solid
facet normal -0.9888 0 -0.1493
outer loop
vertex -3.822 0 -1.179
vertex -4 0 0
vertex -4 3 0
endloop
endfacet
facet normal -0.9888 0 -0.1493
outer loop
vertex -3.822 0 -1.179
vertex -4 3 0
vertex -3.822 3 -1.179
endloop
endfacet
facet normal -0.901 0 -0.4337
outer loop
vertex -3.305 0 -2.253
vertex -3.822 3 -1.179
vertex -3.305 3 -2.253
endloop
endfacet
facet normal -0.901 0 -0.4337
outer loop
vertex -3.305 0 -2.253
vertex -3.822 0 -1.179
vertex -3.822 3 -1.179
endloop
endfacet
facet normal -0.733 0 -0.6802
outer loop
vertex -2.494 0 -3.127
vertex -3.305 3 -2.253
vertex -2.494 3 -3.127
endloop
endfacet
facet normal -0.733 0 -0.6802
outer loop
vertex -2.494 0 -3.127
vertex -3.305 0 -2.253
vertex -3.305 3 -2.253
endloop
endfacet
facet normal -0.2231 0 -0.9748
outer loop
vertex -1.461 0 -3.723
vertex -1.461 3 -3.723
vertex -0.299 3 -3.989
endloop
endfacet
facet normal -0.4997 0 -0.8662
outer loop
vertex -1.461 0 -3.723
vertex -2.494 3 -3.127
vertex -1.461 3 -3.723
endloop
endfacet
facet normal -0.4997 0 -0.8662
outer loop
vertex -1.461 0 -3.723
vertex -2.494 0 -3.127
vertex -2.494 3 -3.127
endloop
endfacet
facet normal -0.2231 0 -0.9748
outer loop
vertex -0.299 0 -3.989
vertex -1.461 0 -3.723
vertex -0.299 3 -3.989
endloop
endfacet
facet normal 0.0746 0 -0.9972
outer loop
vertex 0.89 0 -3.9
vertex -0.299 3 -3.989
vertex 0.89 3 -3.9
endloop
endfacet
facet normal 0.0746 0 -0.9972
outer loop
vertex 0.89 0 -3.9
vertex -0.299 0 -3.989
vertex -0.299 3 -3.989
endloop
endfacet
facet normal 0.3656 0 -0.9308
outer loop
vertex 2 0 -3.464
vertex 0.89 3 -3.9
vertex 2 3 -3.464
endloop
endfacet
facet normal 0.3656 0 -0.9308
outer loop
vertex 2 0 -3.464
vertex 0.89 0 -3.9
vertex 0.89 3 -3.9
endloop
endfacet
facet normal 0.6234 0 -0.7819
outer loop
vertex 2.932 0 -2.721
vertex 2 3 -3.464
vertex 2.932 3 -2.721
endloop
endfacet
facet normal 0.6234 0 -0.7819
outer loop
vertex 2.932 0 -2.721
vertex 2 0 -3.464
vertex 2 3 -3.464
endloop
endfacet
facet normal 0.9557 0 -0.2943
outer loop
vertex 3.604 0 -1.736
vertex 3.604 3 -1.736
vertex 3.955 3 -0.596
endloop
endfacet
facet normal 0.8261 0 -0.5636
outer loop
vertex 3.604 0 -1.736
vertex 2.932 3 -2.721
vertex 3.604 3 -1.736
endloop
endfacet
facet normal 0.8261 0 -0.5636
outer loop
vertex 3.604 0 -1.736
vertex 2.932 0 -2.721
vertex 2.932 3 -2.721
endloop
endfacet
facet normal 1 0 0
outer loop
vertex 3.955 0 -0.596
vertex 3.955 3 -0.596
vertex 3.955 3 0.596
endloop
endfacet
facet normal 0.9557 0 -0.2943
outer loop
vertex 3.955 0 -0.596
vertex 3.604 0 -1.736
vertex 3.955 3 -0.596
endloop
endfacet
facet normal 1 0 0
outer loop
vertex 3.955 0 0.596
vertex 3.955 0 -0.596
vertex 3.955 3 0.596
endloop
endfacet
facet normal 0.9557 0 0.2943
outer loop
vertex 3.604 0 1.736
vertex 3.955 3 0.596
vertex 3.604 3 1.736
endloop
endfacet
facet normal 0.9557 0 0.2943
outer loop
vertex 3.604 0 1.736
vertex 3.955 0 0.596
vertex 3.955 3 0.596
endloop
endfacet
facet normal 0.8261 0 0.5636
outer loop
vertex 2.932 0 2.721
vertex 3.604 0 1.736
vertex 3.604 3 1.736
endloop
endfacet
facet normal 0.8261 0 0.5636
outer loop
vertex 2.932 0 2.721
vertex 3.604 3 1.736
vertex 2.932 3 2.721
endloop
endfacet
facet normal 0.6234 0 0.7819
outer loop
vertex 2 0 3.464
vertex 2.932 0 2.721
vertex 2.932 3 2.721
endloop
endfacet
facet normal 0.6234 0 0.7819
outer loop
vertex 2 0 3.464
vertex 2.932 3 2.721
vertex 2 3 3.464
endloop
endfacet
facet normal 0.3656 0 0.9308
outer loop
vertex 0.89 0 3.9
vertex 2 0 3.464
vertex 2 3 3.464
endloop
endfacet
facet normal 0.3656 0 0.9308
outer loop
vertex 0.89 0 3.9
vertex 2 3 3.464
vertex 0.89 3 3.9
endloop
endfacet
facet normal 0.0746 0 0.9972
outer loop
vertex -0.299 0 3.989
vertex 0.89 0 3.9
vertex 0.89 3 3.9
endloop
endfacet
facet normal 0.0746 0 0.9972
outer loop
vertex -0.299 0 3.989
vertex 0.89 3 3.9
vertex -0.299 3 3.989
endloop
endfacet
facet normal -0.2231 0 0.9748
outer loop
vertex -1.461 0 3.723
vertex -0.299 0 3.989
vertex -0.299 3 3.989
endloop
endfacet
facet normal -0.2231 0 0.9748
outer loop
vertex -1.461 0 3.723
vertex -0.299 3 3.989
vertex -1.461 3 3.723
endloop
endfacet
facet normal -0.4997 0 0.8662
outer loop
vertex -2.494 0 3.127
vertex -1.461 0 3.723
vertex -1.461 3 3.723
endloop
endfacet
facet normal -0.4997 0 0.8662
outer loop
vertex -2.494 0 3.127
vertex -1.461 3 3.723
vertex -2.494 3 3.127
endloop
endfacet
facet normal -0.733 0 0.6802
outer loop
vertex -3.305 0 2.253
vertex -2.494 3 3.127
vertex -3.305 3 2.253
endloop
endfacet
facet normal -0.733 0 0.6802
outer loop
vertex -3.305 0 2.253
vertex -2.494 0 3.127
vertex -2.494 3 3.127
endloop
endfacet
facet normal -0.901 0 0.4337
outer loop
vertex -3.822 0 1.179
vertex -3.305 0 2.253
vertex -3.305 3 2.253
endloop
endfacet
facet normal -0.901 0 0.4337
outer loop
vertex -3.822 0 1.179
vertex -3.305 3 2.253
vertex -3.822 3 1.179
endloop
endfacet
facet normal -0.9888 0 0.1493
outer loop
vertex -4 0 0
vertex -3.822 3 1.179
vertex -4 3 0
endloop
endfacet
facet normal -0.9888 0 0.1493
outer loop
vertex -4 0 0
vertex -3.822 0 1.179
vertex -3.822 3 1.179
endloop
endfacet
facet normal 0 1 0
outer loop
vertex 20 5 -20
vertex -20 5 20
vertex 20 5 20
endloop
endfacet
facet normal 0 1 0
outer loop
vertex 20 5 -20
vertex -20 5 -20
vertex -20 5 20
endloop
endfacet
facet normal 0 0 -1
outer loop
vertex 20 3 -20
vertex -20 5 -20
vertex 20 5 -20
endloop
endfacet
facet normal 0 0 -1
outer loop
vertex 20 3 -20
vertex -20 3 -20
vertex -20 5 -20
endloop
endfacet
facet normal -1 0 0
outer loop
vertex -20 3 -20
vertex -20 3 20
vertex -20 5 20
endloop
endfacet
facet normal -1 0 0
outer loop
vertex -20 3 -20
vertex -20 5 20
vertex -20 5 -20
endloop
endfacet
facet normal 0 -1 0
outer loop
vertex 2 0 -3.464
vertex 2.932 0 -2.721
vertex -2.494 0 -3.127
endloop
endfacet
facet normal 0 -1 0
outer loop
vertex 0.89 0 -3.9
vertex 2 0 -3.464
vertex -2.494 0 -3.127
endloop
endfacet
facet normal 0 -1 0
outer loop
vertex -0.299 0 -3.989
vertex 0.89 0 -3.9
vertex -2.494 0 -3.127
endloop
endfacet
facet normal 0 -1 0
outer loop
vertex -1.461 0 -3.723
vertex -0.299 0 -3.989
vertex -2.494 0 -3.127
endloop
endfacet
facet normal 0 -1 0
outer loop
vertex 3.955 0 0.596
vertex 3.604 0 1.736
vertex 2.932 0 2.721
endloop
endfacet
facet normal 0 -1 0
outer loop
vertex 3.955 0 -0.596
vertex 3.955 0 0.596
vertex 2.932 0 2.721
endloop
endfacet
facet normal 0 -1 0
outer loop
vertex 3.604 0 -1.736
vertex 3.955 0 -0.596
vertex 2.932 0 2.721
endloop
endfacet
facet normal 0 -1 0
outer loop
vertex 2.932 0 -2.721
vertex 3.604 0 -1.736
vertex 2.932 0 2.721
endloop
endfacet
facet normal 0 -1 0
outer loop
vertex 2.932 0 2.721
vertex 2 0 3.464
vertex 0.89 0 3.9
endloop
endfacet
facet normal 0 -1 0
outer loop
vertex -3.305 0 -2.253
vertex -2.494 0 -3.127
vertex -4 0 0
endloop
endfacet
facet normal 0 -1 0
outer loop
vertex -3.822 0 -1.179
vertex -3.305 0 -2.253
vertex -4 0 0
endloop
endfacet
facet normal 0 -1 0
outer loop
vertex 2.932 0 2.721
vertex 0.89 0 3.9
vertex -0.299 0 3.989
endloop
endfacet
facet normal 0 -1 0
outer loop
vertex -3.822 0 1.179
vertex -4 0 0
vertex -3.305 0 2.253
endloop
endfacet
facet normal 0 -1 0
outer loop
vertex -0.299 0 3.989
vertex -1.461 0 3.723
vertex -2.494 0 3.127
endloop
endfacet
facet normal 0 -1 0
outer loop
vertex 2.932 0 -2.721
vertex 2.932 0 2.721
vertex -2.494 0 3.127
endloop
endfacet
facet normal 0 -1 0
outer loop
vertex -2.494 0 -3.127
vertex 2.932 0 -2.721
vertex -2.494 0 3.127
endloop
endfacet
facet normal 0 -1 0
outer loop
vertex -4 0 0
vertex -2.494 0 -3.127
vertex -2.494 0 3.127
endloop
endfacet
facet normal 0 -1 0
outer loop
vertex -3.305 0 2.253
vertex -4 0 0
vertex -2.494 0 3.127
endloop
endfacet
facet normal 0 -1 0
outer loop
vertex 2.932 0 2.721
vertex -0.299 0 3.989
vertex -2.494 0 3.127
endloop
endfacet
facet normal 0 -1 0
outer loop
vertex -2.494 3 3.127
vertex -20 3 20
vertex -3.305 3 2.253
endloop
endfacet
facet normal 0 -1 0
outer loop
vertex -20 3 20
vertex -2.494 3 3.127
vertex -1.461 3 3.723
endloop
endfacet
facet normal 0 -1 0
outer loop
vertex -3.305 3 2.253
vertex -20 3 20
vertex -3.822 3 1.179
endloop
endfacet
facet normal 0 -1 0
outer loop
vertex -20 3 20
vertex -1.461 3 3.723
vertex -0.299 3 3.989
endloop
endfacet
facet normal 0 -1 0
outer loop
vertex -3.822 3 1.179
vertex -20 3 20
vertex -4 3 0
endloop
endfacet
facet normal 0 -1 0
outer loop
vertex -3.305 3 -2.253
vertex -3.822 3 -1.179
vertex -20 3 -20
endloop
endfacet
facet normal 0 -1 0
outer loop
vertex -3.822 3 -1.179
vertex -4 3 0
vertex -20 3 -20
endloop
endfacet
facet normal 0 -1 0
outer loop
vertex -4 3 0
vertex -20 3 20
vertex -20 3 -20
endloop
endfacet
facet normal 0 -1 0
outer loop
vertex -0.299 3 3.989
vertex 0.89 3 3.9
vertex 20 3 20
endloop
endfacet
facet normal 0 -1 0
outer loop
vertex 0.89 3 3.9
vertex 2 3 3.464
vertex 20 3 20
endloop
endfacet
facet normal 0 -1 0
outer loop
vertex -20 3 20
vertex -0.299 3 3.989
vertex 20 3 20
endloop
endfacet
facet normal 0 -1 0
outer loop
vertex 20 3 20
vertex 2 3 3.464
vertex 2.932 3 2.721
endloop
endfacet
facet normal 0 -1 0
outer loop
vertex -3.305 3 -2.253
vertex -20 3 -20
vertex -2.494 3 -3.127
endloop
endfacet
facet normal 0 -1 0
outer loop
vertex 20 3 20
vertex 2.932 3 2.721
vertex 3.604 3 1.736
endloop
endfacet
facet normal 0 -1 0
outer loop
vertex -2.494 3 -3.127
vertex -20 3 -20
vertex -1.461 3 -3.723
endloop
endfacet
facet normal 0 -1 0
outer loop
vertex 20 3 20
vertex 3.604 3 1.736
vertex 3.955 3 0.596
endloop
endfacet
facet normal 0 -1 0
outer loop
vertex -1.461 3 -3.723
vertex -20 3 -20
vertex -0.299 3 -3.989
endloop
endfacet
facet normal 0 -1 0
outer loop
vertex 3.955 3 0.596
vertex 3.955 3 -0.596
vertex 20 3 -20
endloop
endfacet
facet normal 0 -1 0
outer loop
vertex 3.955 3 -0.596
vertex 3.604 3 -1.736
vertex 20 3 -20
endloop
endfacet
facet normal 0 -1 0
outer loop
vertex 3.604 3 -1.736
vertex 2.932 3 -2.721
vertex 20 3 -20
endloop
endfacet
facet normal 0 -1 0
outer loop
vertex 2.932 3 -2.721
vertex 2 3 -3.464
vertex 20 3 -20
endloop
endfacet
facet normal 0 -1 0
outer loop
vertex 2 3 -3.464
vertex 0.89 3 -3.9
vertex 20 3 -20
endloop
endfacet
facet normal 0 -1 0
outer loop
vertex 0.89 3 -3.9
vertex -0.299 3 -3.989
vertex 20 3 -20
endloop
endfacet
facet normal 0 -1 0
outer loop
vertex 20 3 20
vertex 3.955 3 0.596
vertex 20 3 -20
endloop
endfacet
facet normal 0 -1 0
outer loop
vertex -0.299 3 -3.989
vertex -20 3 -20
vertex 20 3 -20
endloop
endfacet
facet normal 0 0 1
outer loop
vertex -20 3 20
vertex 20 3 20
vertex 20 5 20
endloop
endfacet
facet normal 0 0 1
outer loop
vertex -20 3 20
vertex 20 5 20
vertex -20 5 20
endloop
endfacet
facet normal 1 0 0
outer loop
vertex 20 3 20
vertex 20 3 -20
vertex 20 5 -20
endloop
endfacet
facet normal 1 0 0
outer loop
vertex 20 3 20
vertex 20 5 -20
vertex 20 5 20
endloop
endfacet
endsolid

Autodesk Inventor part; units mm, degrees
ref_plane "YZ Plane" through (0, 0, 0) normal (1, 0, 0) x (0, 1, 0)
ref_plane "XZ Plane" through (0, 0, 0) normal (0, 1, 0) x (-1, 0, 0)
ref_plane "XY Plane" through (0, 0, 0) normal (0, 0, 1) x (1, 0, 0)
sketch "Sketch46" plane through (0, 0, 0) normal (0, 1, 0) x (-1, 0, 0)
  circle A0 centre (0, 0) radius 4
  dimension "d158" = 8
extrude "Extrusion35" add sketch "Sketch46" along normal blind 3
sketch "Sketch47" plane through (0, 3, 0) normal (0, 1, 0) x (1, 0, 0)
  line L0 (-20, 20) -> (20, 20)
  line L1 (20, 20) -> (20, -20)
  line L2 (20, -20) -> (-20, -20)
  line L3 (-20, -20) -> (-20, 20)
  line L4 (-20, 20) -> (20, -20) construction
  line L5 (20, 20) -> (-20, -20) construction
  point P0 (0, 0)
  dimension "d161" = 40
  dimension "d162" = 40
extrude "Extrusion36" add sketch "Sketch47" along normal blind 2
properties part number "Front_base"
